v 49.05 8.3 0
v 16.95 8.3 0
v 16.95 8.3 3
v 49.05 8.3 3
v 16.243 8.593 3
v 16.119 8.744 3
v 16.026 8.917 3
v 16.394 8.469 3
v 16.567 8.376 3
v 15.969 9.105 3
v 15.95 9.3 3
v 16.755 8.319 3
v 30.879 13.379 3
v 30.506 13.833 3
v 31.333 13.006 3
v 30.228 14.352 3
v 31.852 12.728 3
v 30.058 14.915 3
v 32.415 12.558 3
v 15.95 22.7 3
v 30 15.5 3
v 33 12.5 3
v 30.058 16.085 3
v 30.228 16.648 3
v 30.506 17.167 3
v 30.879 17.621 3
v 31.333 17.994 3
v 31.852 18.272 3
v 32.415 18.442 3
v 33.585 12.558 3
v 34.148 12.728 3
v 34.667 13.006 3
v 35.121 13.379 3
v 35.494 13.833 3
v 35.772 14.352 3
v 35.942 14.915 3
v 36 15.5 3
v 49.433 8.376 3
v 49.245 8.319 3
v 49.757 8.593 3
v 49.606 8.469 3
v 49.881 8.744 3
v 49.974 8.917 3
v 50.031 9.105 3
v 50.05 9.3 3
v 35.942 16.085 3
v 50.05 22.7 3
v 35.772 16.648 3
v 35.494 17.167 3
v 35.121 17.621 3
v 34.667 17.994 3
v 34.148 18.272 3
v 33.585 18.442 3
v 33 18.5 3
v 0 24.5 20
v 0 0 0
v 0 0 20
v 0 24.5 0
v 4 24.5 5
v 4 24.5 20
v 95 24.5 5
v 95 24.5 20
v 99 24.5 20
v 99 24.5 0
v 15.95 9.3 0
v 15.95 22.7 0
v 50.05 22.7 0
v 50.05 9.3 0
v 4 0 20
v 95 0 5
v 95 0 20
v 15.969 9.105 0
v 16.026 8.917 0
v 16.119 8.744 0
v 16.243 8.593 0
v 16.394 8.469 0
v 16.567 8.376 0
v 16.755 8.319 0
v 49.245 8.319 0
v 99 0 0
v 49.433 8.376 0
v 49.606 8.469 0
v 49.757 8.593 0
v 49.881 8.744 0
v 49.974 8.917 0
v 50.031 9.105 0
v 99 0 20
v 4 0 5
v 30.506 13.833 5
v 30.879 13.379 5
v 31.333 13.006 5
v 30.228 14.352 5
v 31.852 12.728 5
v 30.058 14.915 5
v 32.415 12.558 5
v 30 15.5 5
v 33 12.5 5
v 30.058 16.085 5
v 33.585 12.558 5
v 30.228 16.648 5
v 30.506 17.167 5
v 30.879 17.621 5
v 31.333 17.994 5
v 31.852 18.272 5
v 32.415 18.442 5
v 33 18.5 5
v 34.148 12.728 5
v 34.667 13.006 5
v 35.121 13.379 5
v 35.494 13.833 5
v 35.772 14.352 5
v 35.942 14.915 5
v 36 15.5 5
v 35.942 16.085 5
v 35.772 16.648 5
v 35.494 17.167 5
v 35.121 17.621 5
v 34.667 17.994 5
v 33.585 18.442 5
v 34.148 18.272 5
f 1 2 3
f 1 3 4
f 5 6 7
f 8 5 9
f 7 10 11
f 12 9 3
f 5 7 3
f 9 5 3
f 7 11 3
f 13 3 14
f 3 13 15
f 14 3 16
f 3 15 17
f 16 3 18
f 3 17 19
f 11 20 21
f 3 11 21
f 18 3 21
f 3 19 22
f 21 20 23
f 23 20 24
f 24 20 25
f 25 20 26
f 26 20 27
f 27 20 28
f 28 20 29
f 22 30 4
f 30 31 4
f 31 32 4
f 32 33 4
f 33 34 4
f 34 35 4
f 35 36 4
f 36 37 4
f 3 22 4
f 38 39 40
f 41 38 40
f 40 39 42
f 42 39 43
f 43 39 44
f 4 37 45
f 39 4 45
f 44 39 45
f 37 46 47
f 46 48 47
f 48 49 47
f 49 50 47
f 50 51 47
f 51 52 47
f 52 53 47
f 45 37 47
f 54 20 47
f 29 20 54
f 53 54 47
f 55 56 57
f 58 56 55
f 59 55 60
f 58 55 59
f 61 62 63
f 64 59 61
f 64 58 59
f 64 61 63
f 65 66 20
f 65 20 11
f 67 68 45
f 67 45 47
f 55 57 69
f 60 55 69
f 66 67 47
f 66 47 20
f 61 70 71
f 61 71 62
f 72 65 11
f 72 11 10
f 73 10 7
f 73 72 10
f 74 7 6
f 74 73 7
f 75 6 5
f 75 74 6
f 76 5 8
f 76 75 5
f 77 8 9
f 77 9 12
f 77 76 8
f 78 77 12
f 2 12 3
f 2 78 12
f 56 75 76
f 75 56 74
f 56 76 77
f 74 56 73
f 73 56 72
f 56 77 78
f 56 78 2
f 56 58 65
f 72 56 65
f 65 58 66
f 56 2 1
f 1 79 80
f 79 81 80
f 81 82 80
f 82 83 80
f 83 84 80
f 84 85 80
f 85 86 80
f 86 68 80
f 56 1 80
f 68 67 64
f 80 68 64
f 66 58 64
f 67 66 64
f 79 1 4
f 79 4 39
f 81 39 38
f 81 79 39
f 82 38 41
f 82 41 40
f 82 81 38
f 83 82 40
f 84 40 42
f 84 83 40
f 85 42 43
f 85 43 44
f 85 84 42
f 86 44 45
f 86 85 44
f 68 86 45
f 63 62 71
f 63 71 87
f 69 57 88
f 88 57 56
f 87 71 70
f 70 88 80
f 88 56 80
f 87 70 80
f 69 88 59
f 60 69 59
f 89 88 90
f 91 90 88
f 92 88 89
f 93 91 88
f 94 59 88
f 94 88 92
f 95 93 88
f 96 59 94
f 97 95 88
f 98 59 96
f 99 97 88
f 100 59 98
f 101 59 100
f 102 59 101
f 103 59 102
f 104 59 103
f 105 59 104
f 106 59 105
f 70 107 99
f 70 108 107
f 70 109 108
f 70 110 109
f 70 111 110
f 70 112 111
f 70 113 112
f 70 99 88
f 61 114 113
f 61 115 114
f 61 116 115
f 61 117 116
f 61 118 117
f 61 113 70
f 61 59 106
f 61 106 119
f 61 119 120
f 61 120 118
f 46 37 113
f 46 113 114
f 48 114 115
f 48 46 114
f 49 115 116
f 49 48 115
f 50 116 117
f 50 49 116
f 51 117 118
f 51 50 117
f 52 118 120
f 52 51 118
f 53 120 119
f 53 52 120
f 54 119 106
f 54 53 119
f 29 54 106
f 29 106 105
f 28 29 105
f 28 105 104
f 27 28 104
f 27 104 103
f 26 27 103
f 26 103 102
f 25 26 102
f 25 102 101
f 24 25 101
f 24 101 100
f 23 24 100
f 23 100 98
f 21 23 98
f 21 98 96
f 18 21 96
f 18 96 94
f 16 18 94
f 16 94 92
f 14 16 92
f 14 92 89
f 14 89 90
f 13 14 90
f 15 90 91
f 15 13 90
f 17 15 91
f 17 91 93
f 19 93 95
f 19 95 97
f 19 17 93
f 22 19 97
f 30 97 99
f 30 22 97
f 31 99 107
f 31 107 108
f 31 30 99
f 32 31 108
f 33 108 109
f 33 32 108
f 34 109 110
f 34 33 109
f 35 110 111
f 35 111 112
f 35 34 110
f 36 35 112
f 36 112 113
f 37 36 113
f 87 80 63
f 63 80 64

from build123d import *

# Parameters (mm, degrees)
F0_W     = 91
F0_H     = 24.5
F0_R     = 3
F1_DEPTH = 5
F0_W_2   = 4
F2_DEPTH = 20
F3_R     = 3
F4_DEPTH = 3


with BuildPart() as f1:
    # F0 (on Top) → F1 (new body)
    with BuildSketch(Plane.XY):
        with Locations((49.5, 12.25)):
            Rectangle(F0_W, F0_H)
        with Locations((33, 15.5)):
            Circle(F0_R, mode=Mode.SUBTRACT)
    extrude(amount=F1_DEPTH)

    # F0 (on Top) → F2 (join)
    with BuildSketch(Plane.XY):
        with Locations((2, 12.25)):
            Rectangle(F0_W_2, F0_H)
        with Locations((97, 12.25)):
            Rectangle(F0_W_2, F0_H)
    extrude(amount=F2_DEPTH)

    # F3 (on face) → F4 (cut)
    with BuildSketch(Plane.XY):
        with BuildLine():
            Line((50.05, 22.7), (15.95, 22.7))
            Line((15.95, 22.7), (15.95, 9.3))
            ThreePointArc((15.95, 9.3), (16.242893, 8.592893), (16.95, 8.3))
            Line((16.95, 8.3), (49.05, 8.3))
            ThreePointArc((49.05, 8.3), (49.757107, 8.592893), (50.05, 9.3))
            Line((50.05, 9.3), (50.05, 22.7))
        make_face()
        with Locations((33, 15.5)):
            Circle(F3_R, mode=Mode.SUBTRACT)
    extrude(amount=F4_DEPTH, mode=Mode.SUBTRACT)


solid = f1.part
